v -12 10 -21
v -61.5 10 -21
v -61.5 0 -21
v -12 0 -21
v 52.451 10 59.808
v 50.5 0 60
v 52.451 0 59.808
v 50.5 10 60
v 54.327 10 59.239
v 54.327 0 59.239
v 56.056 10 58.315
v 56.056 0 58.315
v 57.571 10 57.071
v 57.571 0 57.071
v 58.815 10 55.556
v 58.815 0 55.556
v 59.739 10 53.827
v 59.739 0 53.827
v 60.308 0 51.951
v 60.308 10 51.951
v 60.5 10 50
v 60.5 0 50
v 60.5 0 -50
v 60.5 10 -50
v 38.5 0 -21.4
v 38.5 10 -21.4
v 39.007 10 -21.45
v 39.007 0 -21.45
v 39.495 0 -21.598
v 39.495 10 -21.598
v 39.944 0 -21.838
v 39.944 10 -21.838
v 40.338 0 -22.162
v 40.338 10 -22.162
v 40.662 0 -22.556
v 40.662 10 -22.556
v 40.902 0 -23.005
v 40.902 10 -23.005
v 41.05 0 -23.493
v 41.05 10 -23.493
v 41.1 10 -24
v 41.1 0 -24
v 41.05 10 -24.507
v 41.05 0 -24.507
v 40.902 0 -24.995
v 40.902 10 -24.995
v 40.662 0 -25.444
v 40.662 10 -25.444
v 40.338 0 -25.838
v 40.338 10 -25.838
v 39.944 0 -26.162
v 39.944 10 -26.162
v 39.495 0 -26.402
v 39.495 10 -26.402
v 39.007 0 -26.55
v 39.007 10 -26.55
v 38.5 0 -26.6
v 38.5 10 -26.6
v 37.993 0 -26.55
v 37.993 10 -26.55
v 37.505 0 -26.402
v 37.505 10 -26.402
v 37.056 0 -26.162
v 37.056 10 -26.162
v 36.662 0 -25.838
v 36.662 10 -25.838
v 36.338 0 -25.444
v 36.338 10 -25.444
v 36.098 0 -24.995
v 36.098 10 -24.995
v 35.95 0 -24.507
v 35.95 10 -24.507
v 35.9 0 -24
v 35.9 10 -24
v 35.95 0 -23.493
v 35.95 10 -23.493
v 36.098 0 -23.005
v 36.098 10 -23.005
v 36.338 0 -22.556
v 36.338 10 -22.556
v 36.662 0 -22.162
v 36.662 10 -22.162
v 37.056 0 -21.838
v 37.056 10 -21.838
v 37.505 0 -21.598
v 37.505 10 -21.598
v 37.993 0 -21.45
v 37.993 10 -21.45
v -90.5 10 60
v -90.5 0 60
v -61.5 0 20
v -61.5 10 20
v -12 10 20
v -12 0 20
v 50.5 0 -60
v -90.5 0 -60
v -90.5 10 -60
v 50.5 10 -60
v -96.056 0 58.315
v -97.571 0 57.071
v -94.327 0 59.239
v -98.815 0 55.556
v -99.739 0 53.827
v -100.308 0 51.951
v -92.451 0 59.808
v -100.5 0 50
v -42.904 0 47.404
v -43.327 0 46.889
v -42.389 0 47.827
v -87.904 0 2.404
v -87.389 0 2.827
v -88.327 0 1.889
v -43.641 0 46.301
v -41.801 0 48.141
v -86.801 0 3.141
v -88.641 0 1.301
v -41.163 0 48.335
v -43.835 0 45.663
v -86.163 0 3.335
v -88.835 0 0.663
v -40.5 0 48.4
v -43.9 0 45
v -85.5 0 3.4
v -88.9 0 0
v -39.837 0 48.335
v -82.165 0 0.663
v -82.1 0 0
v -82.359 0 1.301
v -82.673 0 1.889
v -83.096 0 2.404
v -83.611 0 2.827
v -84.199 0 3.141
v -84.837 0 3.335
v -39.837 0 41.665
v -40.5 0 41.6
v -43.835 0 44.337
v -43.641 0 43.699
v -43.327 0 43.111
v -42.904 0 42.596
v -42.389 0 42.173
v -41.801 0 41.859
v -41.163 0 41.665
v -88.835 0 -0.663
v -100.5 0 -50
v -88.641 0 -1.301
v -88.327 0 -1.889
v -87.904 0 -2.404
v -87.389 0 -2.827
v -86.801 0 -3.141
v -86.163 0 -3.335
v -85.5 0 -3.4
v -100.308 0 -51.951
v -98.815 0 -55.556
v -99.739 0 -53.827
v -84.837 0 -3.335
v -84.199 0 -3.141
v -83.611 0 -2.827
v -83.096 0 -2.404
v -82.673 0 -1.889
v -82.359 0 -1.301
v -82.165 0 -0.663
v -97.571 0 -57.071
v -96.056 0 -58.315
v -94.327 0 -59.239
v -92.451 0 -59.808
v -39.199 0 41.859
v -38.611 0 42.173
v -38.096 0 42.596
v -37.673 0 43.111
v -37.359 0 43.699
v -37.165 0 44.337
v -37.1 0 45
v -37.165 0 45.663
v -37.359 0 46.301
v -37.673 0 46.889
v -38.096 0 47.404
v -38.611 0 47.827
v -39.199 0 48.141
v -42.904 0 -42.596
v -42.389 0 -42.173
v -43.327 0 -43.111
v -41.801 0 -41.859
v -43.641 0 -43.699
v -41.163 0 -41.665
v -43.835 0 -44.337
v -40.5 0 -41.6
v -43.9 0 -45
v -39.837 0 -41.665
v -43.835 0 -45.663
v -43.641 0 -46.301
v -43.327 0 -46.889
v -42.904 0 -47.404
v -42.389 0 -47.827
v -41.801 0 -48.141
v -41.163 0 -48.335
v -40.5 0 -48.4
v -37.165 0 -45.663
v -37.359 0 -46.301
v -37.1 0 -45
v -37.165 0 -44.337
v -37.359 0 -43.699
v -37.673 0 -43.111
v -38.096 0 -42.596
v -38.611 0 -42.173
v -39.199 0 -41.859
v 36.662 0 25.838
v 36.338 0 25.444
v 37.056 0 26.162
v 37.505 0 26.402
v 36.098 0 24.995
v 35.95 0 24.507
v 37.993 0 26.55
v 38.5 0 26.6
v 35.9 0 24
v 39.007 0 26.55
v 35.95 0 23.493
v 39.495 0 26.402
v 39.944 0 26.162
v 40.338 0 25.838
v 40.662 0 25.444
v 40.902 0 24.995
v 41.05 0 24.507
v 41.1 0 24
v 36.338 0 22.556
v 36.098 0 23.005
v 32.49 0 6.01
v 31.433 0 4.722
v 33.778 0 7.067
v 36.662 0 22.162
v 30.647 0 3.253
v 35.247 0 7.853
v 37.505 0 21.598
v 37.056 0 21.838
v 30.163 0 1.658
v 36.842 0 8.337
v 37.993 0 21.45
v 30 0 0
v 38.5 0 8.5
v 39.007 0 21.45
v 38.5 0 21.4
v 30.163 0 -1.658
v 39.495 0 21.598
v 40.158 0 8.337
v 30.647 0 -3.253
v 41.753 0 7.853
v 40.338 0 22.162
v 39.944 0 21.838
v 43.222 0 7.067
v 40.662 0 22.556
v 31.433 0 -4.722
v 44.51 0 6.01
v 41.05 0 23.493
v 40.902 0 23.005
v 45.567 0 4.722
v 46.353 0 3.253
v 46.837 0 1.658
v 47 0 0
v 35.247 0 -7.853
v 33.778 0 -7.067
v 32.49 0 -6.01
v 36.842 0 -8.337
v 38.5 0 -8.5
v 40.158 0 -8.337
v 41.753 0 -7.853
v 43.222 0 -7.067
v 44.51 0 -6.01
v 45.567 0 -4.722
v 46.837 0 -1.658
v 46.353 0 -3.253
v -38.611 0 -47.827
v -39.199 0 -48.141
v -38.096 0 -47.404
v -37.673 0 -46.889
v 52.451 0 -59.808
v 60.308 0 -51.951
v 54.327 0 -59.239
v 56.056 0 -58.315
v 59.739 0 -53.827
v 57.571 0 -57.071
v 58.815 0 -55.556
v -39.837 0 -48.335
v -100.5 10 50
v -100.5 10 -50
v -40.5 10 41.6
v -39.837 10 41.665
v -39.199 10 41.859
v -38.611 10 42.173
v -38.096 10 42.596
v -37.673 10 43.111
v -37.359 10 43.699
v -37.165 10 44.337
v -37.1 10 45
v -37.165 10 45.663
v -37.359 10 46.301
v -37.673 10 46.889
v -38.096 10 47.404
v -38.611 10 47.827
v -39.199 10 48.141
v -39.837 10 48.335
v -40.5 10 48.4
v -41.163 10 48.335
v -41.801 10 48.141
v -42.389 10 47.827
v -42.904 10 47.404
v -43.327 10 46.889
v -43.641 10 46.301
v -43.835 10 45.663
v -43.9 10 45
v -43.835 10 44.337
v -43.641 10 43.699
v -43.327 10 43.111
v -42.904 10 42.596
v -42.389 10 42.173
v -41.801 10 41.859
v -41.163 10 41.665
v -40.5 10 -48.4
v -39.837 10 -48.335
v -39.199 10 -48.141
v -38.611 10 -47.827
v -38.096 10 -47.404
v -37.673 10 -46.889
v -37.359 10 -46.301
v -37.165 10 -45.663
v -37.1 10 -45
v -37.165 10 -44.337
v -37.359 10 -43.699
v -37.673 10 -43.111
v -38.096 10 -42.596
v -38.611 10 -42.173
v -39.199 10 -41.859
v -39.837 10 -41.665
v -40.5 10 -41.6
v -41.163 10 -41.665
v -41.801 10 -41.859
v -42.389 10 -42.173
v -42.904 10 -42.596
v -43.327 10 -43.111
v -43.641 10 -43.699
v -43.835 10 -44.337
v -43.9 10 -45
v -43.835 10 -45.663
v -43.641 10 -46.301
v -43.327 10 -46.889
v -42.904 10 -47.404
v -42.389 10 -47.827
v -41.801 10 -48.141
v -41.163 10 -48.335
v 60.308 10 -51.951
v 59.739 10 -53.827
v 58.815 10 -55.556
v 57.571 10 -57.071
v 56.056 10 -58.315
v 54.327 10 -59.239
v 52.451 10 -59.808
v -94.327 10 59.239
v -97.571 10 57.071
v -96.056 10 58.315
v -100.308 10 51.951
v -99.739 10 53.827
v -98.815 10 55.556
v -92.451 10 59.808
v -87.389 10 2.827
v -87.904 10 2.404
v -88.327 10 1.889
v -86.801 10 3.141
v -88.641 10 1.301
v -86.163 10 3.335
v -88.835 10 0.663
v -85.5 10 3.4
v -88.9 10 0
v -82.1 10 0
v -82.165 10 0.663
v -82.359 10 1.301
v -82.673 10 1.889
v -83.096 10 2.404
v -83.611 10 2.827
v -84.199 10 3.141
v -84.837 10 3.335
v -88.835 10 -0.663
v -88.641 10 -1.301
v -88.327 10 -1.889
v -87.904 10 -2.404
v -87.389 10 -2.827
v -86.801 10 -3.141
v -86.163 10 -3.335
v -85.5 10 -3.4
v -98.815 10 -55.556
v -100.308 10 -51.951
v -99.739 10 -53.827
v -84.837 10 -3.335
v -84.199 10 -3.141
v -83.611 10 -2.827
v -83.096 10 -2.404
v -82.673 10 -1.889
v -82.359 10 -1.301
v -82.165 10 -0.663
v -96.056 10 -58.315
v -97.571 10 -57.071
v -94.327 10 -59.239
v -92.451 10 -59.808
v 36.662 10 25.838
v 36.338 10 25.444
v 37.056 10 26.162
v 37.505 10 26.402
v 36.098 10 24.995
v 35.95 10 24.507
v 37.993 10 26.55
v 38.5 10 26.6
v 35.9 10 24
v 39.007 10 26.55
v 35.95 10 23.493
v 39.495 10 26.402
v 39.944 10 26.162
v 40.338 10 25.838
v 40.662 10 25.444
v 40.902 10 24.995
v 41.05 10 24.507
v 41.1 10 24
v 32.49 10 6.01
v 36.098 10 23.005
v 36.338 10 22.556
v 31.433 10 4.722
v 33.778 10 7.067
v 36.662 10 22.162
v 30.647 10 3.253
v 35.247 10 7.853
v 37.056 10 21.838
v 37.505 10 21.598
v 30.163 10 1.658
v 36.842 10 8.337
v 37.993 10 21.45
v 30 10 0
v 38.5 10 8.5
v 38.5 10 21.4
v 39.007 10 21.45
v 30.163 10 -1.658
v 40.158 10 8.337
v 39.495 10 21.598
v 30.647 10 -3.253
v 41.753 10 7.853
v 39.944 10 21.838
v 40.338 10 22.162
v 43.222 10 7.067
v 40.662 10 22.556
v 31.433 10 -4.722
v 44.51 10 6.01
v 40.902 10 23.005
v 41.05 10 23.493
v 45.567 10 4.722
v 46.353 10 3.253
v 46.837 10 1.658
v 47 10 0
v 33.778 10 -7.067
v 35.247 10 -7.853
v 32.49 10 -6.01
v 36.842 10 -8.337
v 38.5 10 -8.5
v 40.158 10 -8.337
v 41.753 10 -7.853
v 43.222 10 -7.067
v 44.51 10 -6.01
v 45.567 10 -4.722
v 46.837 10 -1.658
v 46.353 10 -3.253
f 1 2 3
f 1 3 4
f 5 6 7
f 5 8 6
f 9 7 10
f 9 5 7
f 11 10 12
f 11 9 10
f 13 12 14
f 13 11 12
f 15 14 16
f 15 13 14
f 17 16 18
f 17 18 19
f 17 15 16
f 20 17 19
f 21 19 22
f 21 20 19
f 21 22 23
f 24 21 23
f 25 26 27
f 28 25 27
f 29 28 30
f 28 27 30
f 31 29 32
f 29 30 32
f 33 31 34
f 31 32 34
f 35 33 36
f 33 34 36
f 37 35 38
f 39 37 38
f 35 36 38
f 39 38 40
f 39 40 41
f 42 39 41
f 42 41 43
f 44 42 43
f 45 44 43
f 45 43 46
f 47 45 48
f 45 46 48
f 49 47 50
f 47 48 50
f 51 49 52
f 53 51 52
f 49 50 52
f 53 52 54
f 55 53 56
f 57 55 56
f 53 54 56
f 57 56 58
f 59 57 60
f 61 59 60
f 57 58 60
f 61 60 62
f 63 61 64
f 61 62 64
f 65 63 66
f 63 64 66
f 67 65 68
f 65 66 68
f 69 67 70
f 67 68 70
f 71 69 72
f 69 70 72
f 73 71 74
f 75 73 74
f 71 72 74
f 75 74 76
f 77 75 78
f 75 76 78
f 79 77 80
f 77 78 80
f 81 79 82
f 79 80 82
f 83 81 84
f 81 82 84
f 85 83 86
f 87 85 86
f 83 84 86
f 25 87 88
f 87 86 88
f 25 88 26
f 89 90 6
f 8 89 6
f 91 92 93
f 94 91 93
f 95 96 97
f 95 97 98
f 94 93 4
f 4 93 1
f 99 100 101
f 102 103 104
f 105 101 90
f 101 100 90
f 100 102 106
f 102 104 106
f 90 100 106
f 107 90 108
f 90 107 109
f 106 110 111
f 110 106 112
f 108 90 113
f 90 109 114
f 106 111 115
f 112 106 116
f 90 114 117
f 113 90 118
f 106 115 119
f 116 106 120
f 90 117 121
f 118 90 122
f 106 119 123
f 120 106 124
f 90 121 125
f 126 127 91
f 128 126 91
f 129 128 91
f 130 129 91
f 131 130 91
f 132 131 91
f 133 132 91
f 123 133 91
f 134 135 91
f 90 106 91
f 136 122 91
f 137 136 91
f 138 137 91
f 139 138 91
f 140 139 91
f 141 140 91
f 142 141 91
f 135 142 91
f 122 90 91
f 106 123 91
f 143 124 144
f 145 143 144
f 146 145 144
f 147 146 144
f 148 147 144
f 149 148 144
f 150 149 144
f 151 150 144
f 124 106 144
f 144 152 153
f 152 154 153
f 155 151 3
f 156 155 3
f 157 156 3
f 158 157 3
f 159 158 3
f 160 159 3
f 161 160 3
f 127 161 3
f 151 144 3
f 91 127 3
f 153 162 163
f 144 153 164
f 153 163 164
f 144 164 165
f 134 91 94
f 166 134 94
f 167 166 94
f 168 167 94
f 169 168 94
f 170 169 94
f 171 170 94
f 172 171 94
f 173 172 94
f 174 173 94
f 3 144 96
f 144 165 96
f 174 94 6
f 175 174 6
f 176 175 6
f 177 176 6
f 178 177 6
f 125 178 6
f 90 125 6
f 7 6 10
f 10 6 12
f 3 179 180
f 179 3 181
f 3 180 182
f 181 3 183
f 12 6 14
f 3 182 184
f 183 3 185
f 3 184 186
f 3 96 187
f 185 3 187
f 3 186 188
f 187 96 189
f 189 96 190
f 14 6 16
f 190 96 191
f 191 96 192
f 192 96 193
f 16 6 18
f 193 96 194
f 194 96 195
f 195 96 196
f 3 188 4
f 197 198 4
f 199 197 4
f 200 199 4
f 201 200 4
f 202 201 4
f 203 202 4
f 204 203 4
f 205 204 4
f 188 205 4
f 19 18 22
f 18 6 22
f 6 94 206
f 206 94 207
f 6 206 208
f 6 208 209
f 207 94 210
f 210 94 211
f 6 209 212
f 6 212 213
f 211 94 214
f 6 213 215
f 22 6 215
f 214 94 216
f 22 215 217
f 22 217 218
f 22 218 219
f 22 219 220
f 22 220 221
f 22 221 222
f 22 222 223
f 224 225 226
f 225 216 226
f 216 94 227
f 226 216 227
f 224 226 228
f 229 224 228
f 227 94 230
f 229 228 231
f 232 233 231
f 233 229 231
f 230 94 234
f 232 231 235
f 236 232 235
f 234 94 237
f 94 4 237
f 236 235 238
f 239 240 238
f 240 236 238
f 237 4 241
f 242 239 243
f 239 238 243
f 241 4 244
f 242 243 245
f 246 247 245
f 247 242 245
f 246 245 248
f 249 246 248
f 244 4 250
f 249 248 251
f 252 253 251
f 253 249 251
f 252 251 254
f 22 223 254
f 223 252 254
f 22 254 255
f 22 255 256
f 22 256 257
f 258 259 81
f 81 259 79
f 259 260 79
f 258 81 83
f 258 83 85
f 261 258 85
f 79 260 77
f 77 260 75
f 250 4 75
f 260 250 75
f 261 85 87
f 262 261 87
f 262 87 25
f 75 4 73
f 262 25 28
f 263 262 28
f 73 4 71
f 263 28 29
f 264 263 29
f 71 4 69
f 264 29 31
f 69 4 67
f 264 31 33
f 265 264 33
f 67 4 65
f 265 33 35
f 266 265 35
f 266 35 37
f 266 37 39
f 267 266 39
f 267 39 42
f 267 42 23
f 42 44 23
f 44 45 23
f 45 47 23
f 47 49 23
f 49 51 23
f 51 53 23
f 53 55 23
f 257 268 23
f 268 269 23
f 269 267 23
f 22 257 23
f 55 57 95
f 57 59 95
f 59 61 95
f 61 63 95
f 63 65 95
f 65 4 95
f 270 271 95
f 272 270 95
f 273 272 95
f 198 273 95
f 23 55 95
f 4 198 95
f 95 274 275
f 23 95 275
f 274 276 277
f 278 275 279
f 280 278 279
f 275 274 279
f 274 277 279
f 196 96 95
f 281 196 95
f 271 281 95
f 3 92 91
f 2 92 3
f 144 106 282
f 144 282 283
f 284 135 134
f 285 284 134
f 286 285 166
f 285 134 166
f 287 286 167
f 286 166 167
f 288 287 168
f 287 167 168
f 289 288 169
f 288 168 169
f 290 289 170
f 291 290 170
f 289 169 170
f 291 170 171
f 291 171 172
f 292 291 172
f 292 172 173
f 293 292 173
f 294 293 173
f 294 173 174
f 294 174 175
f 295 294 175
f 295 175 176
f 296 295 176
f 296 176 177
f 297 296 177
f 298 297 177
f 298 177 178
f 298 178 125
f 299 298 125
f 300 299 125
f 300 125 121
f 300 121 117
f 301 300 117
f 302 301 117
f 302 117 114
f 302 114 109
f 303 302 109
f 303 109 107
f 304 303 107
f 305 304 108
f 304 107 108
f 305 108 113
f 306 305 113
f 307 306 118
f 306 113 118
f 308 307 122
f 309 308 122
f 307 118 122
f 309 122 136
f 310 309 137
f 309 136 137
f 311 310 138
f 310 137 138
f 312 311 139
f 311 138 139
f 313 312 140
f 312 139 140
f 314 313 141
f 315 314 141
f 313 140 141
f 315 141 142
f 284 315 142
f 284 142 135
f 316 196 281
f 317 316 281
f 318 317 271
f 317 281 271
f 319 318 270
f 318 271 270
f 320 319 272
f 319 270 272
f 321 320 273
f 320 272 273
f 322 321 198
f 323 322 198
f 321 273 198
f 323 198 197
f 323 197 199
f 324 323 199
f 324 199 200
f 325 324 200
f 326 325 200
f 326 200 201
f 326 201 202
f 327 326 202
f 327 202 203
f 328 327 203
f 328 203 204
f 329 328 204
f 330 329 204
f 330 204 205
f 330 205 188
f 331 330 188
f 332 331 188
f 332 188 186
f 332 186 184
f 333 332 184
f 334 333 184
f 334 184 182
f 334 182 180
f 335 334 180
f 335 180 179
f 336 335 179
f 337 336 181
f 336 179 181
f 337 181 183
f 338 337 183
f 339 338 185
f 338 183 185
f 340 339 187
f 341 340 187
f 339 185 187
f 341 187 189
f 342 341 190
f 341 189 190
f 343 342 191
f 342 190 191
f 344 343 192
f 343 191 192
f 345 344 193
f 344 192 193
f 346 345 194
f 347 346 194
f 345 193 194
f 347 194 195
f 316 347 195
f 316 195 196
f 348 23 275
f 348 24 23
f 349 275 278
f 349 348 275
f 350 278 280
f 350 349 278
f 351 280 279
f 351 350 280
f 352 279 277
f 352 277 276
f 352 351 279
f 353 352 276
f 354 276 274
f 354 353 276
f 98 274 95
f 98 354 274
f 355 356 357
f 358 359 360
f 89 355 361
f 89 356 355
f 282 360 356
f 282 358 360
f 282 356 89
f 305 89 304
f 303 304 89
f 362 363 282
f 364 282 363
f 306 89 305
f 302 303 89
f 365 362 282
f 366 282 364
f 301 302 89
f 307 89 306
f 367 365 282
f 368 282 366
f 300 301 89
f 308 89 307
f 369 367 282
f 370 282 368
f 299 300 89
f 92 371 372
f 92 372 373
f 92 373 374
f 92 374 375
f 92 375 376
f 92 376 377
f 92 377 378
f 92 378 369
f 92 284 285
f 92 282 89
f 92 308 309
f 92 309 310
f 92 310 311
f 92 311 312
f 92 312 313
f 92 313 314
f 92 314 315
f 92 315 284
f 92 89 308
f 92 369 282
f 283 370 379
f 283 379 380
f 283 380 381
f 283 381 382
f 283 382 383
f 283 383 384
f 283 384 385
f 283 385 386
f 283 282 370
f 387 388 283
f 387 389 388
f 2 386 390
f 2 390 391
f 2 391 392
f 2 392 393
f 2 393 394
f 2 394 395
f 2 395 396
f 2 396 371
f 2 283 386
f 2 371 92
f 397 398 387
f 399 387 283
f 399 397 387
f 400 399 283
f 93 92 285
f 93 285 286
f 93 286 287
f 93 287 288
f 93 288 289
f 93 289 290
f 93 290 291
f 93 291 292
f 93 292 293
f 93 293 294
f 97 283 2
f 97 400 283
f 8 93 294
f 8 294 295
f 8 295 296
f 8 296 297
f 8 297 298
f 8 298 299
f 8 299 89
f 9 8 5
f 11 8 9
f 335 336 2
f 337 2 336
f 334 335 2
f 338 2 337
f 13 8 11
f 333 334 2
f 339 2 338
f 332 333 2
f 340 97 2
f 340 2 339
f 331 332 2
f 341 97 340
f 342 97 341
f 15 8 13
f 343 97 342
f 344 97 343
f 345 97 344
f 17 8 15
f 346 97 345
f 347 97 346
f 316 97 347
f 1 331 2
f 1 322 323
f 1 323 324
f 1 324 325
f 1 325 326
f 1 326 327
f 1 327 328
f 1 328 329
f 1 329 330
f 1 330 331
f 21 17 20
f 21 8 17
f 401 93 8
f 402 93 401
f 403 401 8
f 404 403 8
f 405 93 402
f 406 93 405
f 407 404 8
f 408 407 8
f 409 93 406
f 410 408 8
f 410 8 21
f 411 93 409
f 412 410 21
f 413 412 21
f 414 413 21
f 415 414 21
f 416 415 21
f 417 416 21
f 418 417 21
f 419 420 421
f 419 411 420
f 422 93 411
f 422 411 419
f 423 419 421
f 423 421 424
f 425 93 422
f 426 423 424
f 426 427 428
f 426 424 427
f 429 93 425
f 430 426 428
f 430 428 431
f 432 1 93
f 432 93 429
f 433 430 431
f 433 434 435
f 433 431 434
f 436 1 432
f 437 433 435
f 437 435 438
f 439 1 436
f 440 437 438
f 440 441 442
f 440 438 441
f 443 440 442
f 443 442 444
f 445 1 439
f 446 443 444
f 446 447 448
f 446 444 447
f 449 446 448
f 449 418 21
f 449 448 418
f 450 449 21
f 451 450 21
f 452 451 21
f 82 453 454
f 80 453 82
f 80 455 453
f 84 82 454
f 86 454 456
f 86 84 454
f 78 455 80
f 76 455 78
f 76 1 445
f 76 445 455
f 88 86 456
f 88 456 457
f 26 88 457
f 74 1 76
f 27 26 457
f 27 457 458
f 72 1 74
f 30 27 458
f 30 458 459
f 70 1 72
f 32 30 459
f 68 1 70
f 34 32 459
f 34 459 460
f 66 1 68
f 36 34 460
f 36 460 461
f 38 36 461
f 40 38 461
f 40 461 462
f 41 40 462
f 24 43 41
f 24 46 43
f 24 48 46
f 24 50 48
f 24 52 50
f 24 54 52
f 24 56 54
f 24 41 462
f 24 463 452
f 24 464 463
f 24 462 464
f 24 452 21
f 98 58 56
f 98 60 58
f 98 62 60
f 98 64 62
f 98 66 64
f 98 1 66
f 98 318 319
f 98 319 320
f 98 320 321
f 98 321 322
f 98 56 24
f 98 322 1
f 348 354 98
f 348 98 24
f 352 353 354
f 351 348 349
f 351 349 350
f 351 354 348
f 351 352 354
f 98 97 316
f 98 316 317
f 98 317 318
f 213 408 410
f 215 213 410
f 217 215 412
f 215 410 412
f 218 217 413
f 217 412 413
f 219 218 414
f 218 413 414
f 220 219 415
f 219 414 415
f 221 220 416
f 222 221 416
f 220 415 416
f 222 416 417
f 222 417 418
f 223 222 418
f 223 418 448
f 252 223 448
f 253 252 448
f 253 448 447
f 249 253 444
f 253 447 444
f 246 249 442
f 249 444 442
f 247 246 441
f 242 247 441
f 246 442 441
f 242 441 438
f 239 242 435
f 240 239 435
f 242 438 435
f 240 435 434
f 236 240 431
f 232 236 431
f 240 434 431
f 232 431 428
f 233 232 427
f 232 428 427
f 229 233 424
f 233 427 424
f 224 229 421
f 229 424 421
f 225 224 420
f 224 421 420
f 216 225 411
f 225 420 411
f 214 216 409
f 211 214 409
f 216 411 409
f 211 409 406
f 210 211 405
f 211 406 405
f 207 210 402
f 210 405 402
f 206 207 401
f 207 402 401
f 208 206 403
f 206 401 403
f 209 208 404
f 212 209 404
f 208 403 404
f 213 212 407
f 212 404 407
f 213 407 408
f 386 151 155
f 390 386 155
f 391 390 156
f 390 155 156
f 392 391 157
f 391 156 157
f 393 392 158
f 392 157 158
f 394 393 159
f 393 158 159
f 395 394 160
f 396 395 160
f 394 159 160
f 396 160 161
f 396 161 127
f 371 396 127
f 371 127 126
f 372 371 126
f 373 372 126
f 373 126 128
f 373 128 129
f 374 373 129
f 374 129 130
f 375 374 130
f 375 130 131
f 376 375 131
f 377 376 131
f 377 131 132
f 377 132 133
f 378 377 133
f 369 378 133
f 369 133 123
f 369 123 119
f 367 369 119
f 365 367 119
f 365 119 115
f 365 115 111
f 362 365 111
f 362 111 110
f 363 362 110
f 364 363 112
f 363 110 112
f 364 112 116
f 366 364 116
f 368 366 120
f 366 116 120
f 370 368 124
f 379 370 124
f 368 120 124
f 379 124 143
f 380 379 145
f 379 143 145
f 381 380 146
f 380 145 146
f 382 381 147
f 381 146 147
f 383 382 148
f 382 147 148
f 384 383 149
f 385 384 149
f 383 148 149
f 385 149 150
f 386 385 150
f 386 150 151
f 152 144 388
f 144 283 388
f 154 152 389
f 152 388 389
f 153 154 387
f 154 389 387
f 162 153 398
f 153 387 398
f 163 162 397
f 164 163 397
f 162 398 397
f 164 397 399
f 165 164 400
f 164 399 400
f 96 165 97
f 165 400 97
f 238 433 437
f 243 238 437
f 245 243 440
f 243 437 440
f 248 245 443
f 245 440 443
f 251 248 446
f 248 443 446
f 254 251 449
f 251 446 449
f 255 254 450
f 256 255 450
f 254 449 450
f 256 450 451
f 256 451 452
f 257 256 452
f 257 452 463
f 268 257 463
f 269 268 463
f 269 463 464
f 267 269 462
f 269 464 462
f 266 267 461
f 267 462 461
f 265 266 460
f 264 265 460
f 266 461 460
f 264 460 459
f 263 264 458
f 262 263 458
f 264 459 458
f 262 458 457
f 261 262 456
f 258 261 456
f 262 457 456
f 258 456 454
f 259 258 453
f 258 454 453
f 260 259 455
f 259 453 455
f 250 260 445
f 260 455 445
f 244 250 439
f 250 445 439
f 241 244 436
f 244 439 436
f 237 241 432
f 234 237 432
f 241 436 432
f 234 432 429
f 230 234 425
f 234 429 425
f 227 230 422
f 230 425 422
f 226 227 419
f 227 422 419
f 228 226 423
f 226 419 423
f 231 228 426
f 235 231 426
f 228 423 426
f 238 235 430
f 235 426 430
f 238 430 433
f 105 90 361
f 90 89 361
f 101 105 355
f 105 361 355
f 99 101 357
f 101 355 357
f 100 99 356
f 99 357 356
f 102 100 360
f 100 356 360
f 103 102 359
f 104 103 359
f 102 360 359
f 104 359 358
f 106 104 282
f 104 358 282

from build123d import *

# Parameters (mm, degrees)
SKETCH_1_W          = 161
SKETCH_1_H          = 120
EXTRUDE_1_DEPTH     = 10
FILLET_1_R          = 10
SKETCH_2_W          = 49.5
SKETCH_2_H          = 41
CUT_EXTRUDE_1_DEPTH = 10
SKETCH_3_R          = 8.5
CUT_EXTRUDE_2_DEPTH = 10
FILLET_2_R          = 10
SKETCH_5_R          = 3.4
CUT_EXTRUDE_4_DEPTH = 118.474465311
SKETCH_6_R          = 2.6
CUT_EXTRUDE_5_DEPTH = 10


with BuildPart() as part:
    # 草图1 → 凸台-拉伸1 (new body)
    with BuildSketch(Plane(origin=(0, 0, 0), x_dir=(1, 0, 0), z_dir=(0, 1, 0))):
        with Locations((-20, 0)):
            Rectangle(SKETCH_1_W, SKETCH_1_H)
    extrude(amount=EXTRUDE_1_DEPTH)

    # 圆角1
    fillet_1_edges = [part.edges().sort_by_distance(p)[0] for p in [
        (60.5, 5, 60),
        (60.5, 5, -60),
    ]]
    fillet(fillet_1_edges, radius=FILLET_1_R)

    # 草图2 → 切除-拉伸1 (cut)
    with BuildSketch(Plane(origin=(0, 10, 0), x_dir=(1, 0, 0), z_dir=(0, 1, 0))):
        with Locations((-36.75, 0.5)):
            Rectangle(SKETCH_2_W, SKETCH_2_H)
    extrude(amount=-CUT_EXTRUDE_1_DEPTH, mode=Mode.SUBTRACT)

    # 草图3 → 切除-拉伸2 (cut)
    with BuildSketch(Plane(origin=(0, 10, 0), x_dir=(1, 0, 0), z_dir=(0, 1, 0))):
        with Locations(Location((38.5, 0, 0), (0, 0, 270))):
            Circle(SKETCH_3_R)
    extrude(amount=-CUT_EXTRUDE_2_DEPTH, mode=Mode.SUBTRACT)

    # 圆角2
    fillet_2_edges = [part.edges().sort_by_distance(p)[0] for p in [
        (-100.5, 5, 60),
        (-100.5, 5, -60),
    ]]
    fillet(fillet_2_edges, radius=FILLET_2_R)

    # 草图5 → 切除-拉伸4 (cut, through all)
    with BuildSketch(Plane.XZ):
        with Locations(Location((-40.5, 45, 0), (0, 0, 270))):
            Circle(SKETCH_5_R)
        with Locations(Location((-85.5, 0, 0), (0, 0, 270))):
            Circle(SKETCH_5_R)
        with Locations(Location((-40.5, -45, 0), (0, 0, 270))):
            Circle(SKETCH_5_R)
    extrude(amount=-CUT_EXTRUDE_4_DEPTH, mode=Mode.SUBTRACT)

    # 草图6 → 切除-拉伸5 (cut)
    with BuildSketch(Plane(origin=(0, 10, 0), x_dir=(1, 0, 0), z_dir=(0, 1, 0))):
        with Locations(Location((38.5, 24, 0), (0, 0, 270))):
            Circle(SKETCH_6_R)
        with Locations(Location((38.5, -24, 0), (0, 0, 270))):
            Circle(SKETCH_6_R)
    extrude(amount=-CUT_EXTRUDE_5_DEPTH, mode=Mode.SUBTRACT)


solid = part.part
